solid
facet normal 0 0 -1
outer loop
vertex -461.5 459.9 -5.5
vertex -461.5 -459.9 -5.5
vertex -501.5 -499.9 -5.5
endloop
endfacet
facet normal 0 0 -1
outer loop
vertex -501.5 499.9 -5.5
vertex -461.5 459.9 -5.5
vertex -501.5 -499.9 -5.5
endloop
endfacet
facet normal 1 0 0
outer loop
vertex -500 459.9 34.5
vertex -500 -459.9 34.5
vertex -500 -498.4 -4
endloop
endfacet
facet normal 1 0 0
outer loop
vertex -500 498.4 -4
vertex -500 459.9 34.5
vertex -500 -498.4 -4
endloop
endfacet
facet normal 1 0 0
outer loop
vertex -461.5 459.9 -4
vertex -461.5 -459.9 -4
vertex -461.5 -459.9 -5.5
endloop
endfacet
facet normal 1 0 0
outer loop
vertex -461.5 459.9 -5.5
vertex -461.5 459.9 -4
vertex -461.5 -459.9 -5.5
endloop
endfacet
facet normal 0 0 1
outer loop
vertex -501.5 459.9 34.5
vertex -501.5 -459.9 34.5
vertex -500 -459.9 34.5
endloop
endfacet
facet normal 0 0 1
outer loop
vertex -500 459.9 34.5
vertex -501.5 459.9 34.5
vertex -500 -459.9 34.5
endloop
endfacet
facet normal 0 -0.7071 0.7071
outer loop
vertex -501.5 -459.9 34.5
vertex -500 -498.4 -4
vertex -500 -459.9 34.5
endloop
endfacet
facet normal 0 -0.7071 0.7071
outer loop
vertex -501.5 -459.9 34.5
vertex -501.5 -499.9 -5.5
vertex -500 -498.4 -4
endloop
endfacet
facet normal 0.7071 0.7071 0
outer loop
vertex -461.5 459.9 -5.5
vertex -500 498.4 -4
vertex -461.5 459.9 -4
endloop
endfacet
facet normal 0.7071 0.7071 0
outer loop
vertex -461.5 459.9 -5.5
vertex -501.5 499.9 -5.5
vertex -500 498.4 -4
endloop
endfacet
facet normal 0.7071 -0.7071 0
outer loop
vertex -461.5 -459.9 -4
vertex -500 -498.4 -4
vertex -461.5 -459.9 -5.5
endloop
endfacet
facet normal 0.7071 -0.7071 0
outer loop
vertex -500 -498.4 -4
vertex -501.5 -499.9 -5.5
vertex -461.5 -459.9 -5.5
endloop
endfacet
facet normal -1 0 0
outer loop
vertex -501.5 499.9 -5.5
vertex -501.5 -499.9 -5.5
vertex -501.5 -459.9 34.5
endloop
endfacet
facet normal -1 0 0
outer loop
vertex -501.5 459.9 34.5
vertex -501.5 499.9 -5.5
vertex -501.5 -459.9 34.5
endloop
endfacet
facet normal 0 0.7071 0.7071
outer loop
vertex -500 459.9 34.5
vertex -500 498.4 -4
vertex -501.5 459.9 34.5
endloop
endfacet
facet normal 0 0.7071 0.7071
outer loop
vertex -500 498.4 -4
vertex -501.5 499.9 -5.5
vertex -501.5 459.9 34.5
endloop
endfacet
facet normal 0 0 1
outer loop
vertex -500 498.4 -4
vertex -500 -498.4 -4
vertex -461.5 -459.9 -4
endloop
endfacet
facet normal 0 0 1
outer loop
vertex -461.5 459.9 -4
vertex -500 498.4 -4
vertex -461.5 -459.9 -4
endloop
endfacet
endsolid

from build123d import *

# Parameters (mm, degrees)
AUFSATZ_LINEAR_AUSTRAGEN1_DEPTH      = 499.9
AUFSATZ_LINEAR_AUSTRAGEN1_DEPTH_BACK = 499.9
SCHNITT_LINEAR_AUSTRAGEN1_DEPTH      = 1.5
SCHNITT_LINEAR_AUSTRAGEN2_DEPTH      = 1.5


with BuildPart() as part:
    # Skizze1 → Aufsatz-Linear austragen1 (new, two sides: drawn at the far end of the back side and taken through both)
    with BuildSketch(Plane(origin=(0, 0, 0), x_dir=(1, 0, 0), z_dir=(0, 1, 0)).offset(-AUFSATZ_LINEAR_AUSTRAGEN1_DEPTH_BACK)):
        Polygon((-461.5, 4), (-461.5, 5.5), (-501.5, 5.5), (-501.5, -34.5), (-500, -34.5), (-500, 4), align=None)
    extrude(amount=AUFSATZ_LINEAR_AUSTRAGEN1_DEPTH + AUFSATZ_LINEAR_AUSTRAGEN1_DEPTH_BACK)

    # Skizze2 → Schnitt-Linear austragen1 (cut)
    with BuildSketch(Plane(origin=(0, 0, -5.5), x_dir=(-1, 0, 0), z_dir=(0, 0, -1))):
        Polygon((501.5, 499.9), (461.5, 459.9), (461.5, 499.9), align=None)
        Polygon((461.5, -459.9), (461.5, -499.9), (501.5, -499.9), align=None)
    extrude(amount=-SCHNITT_LINEAR_AUSTRAGEN1_DEPTH, mode=Mode.SUBTRACT)

    # Skizze3 → Schnitt-Linear austragen2 (cut)
    with BuildSketch(Plane.ZY.offset(501.5)):
        Polygon((34.5, 499.9), (-5.5, 499.9), (34.5, 459.9), align=None)
        Polygon((-5.5, -499.9), (34.5, -459.9), (34.5, -499.9), align=None)
    extrude(amount=-SCHNITT_LINEAR_AUSTRAGEN2_DEPTH, mode=Mode.SUBTRACT)


solid = part.part
